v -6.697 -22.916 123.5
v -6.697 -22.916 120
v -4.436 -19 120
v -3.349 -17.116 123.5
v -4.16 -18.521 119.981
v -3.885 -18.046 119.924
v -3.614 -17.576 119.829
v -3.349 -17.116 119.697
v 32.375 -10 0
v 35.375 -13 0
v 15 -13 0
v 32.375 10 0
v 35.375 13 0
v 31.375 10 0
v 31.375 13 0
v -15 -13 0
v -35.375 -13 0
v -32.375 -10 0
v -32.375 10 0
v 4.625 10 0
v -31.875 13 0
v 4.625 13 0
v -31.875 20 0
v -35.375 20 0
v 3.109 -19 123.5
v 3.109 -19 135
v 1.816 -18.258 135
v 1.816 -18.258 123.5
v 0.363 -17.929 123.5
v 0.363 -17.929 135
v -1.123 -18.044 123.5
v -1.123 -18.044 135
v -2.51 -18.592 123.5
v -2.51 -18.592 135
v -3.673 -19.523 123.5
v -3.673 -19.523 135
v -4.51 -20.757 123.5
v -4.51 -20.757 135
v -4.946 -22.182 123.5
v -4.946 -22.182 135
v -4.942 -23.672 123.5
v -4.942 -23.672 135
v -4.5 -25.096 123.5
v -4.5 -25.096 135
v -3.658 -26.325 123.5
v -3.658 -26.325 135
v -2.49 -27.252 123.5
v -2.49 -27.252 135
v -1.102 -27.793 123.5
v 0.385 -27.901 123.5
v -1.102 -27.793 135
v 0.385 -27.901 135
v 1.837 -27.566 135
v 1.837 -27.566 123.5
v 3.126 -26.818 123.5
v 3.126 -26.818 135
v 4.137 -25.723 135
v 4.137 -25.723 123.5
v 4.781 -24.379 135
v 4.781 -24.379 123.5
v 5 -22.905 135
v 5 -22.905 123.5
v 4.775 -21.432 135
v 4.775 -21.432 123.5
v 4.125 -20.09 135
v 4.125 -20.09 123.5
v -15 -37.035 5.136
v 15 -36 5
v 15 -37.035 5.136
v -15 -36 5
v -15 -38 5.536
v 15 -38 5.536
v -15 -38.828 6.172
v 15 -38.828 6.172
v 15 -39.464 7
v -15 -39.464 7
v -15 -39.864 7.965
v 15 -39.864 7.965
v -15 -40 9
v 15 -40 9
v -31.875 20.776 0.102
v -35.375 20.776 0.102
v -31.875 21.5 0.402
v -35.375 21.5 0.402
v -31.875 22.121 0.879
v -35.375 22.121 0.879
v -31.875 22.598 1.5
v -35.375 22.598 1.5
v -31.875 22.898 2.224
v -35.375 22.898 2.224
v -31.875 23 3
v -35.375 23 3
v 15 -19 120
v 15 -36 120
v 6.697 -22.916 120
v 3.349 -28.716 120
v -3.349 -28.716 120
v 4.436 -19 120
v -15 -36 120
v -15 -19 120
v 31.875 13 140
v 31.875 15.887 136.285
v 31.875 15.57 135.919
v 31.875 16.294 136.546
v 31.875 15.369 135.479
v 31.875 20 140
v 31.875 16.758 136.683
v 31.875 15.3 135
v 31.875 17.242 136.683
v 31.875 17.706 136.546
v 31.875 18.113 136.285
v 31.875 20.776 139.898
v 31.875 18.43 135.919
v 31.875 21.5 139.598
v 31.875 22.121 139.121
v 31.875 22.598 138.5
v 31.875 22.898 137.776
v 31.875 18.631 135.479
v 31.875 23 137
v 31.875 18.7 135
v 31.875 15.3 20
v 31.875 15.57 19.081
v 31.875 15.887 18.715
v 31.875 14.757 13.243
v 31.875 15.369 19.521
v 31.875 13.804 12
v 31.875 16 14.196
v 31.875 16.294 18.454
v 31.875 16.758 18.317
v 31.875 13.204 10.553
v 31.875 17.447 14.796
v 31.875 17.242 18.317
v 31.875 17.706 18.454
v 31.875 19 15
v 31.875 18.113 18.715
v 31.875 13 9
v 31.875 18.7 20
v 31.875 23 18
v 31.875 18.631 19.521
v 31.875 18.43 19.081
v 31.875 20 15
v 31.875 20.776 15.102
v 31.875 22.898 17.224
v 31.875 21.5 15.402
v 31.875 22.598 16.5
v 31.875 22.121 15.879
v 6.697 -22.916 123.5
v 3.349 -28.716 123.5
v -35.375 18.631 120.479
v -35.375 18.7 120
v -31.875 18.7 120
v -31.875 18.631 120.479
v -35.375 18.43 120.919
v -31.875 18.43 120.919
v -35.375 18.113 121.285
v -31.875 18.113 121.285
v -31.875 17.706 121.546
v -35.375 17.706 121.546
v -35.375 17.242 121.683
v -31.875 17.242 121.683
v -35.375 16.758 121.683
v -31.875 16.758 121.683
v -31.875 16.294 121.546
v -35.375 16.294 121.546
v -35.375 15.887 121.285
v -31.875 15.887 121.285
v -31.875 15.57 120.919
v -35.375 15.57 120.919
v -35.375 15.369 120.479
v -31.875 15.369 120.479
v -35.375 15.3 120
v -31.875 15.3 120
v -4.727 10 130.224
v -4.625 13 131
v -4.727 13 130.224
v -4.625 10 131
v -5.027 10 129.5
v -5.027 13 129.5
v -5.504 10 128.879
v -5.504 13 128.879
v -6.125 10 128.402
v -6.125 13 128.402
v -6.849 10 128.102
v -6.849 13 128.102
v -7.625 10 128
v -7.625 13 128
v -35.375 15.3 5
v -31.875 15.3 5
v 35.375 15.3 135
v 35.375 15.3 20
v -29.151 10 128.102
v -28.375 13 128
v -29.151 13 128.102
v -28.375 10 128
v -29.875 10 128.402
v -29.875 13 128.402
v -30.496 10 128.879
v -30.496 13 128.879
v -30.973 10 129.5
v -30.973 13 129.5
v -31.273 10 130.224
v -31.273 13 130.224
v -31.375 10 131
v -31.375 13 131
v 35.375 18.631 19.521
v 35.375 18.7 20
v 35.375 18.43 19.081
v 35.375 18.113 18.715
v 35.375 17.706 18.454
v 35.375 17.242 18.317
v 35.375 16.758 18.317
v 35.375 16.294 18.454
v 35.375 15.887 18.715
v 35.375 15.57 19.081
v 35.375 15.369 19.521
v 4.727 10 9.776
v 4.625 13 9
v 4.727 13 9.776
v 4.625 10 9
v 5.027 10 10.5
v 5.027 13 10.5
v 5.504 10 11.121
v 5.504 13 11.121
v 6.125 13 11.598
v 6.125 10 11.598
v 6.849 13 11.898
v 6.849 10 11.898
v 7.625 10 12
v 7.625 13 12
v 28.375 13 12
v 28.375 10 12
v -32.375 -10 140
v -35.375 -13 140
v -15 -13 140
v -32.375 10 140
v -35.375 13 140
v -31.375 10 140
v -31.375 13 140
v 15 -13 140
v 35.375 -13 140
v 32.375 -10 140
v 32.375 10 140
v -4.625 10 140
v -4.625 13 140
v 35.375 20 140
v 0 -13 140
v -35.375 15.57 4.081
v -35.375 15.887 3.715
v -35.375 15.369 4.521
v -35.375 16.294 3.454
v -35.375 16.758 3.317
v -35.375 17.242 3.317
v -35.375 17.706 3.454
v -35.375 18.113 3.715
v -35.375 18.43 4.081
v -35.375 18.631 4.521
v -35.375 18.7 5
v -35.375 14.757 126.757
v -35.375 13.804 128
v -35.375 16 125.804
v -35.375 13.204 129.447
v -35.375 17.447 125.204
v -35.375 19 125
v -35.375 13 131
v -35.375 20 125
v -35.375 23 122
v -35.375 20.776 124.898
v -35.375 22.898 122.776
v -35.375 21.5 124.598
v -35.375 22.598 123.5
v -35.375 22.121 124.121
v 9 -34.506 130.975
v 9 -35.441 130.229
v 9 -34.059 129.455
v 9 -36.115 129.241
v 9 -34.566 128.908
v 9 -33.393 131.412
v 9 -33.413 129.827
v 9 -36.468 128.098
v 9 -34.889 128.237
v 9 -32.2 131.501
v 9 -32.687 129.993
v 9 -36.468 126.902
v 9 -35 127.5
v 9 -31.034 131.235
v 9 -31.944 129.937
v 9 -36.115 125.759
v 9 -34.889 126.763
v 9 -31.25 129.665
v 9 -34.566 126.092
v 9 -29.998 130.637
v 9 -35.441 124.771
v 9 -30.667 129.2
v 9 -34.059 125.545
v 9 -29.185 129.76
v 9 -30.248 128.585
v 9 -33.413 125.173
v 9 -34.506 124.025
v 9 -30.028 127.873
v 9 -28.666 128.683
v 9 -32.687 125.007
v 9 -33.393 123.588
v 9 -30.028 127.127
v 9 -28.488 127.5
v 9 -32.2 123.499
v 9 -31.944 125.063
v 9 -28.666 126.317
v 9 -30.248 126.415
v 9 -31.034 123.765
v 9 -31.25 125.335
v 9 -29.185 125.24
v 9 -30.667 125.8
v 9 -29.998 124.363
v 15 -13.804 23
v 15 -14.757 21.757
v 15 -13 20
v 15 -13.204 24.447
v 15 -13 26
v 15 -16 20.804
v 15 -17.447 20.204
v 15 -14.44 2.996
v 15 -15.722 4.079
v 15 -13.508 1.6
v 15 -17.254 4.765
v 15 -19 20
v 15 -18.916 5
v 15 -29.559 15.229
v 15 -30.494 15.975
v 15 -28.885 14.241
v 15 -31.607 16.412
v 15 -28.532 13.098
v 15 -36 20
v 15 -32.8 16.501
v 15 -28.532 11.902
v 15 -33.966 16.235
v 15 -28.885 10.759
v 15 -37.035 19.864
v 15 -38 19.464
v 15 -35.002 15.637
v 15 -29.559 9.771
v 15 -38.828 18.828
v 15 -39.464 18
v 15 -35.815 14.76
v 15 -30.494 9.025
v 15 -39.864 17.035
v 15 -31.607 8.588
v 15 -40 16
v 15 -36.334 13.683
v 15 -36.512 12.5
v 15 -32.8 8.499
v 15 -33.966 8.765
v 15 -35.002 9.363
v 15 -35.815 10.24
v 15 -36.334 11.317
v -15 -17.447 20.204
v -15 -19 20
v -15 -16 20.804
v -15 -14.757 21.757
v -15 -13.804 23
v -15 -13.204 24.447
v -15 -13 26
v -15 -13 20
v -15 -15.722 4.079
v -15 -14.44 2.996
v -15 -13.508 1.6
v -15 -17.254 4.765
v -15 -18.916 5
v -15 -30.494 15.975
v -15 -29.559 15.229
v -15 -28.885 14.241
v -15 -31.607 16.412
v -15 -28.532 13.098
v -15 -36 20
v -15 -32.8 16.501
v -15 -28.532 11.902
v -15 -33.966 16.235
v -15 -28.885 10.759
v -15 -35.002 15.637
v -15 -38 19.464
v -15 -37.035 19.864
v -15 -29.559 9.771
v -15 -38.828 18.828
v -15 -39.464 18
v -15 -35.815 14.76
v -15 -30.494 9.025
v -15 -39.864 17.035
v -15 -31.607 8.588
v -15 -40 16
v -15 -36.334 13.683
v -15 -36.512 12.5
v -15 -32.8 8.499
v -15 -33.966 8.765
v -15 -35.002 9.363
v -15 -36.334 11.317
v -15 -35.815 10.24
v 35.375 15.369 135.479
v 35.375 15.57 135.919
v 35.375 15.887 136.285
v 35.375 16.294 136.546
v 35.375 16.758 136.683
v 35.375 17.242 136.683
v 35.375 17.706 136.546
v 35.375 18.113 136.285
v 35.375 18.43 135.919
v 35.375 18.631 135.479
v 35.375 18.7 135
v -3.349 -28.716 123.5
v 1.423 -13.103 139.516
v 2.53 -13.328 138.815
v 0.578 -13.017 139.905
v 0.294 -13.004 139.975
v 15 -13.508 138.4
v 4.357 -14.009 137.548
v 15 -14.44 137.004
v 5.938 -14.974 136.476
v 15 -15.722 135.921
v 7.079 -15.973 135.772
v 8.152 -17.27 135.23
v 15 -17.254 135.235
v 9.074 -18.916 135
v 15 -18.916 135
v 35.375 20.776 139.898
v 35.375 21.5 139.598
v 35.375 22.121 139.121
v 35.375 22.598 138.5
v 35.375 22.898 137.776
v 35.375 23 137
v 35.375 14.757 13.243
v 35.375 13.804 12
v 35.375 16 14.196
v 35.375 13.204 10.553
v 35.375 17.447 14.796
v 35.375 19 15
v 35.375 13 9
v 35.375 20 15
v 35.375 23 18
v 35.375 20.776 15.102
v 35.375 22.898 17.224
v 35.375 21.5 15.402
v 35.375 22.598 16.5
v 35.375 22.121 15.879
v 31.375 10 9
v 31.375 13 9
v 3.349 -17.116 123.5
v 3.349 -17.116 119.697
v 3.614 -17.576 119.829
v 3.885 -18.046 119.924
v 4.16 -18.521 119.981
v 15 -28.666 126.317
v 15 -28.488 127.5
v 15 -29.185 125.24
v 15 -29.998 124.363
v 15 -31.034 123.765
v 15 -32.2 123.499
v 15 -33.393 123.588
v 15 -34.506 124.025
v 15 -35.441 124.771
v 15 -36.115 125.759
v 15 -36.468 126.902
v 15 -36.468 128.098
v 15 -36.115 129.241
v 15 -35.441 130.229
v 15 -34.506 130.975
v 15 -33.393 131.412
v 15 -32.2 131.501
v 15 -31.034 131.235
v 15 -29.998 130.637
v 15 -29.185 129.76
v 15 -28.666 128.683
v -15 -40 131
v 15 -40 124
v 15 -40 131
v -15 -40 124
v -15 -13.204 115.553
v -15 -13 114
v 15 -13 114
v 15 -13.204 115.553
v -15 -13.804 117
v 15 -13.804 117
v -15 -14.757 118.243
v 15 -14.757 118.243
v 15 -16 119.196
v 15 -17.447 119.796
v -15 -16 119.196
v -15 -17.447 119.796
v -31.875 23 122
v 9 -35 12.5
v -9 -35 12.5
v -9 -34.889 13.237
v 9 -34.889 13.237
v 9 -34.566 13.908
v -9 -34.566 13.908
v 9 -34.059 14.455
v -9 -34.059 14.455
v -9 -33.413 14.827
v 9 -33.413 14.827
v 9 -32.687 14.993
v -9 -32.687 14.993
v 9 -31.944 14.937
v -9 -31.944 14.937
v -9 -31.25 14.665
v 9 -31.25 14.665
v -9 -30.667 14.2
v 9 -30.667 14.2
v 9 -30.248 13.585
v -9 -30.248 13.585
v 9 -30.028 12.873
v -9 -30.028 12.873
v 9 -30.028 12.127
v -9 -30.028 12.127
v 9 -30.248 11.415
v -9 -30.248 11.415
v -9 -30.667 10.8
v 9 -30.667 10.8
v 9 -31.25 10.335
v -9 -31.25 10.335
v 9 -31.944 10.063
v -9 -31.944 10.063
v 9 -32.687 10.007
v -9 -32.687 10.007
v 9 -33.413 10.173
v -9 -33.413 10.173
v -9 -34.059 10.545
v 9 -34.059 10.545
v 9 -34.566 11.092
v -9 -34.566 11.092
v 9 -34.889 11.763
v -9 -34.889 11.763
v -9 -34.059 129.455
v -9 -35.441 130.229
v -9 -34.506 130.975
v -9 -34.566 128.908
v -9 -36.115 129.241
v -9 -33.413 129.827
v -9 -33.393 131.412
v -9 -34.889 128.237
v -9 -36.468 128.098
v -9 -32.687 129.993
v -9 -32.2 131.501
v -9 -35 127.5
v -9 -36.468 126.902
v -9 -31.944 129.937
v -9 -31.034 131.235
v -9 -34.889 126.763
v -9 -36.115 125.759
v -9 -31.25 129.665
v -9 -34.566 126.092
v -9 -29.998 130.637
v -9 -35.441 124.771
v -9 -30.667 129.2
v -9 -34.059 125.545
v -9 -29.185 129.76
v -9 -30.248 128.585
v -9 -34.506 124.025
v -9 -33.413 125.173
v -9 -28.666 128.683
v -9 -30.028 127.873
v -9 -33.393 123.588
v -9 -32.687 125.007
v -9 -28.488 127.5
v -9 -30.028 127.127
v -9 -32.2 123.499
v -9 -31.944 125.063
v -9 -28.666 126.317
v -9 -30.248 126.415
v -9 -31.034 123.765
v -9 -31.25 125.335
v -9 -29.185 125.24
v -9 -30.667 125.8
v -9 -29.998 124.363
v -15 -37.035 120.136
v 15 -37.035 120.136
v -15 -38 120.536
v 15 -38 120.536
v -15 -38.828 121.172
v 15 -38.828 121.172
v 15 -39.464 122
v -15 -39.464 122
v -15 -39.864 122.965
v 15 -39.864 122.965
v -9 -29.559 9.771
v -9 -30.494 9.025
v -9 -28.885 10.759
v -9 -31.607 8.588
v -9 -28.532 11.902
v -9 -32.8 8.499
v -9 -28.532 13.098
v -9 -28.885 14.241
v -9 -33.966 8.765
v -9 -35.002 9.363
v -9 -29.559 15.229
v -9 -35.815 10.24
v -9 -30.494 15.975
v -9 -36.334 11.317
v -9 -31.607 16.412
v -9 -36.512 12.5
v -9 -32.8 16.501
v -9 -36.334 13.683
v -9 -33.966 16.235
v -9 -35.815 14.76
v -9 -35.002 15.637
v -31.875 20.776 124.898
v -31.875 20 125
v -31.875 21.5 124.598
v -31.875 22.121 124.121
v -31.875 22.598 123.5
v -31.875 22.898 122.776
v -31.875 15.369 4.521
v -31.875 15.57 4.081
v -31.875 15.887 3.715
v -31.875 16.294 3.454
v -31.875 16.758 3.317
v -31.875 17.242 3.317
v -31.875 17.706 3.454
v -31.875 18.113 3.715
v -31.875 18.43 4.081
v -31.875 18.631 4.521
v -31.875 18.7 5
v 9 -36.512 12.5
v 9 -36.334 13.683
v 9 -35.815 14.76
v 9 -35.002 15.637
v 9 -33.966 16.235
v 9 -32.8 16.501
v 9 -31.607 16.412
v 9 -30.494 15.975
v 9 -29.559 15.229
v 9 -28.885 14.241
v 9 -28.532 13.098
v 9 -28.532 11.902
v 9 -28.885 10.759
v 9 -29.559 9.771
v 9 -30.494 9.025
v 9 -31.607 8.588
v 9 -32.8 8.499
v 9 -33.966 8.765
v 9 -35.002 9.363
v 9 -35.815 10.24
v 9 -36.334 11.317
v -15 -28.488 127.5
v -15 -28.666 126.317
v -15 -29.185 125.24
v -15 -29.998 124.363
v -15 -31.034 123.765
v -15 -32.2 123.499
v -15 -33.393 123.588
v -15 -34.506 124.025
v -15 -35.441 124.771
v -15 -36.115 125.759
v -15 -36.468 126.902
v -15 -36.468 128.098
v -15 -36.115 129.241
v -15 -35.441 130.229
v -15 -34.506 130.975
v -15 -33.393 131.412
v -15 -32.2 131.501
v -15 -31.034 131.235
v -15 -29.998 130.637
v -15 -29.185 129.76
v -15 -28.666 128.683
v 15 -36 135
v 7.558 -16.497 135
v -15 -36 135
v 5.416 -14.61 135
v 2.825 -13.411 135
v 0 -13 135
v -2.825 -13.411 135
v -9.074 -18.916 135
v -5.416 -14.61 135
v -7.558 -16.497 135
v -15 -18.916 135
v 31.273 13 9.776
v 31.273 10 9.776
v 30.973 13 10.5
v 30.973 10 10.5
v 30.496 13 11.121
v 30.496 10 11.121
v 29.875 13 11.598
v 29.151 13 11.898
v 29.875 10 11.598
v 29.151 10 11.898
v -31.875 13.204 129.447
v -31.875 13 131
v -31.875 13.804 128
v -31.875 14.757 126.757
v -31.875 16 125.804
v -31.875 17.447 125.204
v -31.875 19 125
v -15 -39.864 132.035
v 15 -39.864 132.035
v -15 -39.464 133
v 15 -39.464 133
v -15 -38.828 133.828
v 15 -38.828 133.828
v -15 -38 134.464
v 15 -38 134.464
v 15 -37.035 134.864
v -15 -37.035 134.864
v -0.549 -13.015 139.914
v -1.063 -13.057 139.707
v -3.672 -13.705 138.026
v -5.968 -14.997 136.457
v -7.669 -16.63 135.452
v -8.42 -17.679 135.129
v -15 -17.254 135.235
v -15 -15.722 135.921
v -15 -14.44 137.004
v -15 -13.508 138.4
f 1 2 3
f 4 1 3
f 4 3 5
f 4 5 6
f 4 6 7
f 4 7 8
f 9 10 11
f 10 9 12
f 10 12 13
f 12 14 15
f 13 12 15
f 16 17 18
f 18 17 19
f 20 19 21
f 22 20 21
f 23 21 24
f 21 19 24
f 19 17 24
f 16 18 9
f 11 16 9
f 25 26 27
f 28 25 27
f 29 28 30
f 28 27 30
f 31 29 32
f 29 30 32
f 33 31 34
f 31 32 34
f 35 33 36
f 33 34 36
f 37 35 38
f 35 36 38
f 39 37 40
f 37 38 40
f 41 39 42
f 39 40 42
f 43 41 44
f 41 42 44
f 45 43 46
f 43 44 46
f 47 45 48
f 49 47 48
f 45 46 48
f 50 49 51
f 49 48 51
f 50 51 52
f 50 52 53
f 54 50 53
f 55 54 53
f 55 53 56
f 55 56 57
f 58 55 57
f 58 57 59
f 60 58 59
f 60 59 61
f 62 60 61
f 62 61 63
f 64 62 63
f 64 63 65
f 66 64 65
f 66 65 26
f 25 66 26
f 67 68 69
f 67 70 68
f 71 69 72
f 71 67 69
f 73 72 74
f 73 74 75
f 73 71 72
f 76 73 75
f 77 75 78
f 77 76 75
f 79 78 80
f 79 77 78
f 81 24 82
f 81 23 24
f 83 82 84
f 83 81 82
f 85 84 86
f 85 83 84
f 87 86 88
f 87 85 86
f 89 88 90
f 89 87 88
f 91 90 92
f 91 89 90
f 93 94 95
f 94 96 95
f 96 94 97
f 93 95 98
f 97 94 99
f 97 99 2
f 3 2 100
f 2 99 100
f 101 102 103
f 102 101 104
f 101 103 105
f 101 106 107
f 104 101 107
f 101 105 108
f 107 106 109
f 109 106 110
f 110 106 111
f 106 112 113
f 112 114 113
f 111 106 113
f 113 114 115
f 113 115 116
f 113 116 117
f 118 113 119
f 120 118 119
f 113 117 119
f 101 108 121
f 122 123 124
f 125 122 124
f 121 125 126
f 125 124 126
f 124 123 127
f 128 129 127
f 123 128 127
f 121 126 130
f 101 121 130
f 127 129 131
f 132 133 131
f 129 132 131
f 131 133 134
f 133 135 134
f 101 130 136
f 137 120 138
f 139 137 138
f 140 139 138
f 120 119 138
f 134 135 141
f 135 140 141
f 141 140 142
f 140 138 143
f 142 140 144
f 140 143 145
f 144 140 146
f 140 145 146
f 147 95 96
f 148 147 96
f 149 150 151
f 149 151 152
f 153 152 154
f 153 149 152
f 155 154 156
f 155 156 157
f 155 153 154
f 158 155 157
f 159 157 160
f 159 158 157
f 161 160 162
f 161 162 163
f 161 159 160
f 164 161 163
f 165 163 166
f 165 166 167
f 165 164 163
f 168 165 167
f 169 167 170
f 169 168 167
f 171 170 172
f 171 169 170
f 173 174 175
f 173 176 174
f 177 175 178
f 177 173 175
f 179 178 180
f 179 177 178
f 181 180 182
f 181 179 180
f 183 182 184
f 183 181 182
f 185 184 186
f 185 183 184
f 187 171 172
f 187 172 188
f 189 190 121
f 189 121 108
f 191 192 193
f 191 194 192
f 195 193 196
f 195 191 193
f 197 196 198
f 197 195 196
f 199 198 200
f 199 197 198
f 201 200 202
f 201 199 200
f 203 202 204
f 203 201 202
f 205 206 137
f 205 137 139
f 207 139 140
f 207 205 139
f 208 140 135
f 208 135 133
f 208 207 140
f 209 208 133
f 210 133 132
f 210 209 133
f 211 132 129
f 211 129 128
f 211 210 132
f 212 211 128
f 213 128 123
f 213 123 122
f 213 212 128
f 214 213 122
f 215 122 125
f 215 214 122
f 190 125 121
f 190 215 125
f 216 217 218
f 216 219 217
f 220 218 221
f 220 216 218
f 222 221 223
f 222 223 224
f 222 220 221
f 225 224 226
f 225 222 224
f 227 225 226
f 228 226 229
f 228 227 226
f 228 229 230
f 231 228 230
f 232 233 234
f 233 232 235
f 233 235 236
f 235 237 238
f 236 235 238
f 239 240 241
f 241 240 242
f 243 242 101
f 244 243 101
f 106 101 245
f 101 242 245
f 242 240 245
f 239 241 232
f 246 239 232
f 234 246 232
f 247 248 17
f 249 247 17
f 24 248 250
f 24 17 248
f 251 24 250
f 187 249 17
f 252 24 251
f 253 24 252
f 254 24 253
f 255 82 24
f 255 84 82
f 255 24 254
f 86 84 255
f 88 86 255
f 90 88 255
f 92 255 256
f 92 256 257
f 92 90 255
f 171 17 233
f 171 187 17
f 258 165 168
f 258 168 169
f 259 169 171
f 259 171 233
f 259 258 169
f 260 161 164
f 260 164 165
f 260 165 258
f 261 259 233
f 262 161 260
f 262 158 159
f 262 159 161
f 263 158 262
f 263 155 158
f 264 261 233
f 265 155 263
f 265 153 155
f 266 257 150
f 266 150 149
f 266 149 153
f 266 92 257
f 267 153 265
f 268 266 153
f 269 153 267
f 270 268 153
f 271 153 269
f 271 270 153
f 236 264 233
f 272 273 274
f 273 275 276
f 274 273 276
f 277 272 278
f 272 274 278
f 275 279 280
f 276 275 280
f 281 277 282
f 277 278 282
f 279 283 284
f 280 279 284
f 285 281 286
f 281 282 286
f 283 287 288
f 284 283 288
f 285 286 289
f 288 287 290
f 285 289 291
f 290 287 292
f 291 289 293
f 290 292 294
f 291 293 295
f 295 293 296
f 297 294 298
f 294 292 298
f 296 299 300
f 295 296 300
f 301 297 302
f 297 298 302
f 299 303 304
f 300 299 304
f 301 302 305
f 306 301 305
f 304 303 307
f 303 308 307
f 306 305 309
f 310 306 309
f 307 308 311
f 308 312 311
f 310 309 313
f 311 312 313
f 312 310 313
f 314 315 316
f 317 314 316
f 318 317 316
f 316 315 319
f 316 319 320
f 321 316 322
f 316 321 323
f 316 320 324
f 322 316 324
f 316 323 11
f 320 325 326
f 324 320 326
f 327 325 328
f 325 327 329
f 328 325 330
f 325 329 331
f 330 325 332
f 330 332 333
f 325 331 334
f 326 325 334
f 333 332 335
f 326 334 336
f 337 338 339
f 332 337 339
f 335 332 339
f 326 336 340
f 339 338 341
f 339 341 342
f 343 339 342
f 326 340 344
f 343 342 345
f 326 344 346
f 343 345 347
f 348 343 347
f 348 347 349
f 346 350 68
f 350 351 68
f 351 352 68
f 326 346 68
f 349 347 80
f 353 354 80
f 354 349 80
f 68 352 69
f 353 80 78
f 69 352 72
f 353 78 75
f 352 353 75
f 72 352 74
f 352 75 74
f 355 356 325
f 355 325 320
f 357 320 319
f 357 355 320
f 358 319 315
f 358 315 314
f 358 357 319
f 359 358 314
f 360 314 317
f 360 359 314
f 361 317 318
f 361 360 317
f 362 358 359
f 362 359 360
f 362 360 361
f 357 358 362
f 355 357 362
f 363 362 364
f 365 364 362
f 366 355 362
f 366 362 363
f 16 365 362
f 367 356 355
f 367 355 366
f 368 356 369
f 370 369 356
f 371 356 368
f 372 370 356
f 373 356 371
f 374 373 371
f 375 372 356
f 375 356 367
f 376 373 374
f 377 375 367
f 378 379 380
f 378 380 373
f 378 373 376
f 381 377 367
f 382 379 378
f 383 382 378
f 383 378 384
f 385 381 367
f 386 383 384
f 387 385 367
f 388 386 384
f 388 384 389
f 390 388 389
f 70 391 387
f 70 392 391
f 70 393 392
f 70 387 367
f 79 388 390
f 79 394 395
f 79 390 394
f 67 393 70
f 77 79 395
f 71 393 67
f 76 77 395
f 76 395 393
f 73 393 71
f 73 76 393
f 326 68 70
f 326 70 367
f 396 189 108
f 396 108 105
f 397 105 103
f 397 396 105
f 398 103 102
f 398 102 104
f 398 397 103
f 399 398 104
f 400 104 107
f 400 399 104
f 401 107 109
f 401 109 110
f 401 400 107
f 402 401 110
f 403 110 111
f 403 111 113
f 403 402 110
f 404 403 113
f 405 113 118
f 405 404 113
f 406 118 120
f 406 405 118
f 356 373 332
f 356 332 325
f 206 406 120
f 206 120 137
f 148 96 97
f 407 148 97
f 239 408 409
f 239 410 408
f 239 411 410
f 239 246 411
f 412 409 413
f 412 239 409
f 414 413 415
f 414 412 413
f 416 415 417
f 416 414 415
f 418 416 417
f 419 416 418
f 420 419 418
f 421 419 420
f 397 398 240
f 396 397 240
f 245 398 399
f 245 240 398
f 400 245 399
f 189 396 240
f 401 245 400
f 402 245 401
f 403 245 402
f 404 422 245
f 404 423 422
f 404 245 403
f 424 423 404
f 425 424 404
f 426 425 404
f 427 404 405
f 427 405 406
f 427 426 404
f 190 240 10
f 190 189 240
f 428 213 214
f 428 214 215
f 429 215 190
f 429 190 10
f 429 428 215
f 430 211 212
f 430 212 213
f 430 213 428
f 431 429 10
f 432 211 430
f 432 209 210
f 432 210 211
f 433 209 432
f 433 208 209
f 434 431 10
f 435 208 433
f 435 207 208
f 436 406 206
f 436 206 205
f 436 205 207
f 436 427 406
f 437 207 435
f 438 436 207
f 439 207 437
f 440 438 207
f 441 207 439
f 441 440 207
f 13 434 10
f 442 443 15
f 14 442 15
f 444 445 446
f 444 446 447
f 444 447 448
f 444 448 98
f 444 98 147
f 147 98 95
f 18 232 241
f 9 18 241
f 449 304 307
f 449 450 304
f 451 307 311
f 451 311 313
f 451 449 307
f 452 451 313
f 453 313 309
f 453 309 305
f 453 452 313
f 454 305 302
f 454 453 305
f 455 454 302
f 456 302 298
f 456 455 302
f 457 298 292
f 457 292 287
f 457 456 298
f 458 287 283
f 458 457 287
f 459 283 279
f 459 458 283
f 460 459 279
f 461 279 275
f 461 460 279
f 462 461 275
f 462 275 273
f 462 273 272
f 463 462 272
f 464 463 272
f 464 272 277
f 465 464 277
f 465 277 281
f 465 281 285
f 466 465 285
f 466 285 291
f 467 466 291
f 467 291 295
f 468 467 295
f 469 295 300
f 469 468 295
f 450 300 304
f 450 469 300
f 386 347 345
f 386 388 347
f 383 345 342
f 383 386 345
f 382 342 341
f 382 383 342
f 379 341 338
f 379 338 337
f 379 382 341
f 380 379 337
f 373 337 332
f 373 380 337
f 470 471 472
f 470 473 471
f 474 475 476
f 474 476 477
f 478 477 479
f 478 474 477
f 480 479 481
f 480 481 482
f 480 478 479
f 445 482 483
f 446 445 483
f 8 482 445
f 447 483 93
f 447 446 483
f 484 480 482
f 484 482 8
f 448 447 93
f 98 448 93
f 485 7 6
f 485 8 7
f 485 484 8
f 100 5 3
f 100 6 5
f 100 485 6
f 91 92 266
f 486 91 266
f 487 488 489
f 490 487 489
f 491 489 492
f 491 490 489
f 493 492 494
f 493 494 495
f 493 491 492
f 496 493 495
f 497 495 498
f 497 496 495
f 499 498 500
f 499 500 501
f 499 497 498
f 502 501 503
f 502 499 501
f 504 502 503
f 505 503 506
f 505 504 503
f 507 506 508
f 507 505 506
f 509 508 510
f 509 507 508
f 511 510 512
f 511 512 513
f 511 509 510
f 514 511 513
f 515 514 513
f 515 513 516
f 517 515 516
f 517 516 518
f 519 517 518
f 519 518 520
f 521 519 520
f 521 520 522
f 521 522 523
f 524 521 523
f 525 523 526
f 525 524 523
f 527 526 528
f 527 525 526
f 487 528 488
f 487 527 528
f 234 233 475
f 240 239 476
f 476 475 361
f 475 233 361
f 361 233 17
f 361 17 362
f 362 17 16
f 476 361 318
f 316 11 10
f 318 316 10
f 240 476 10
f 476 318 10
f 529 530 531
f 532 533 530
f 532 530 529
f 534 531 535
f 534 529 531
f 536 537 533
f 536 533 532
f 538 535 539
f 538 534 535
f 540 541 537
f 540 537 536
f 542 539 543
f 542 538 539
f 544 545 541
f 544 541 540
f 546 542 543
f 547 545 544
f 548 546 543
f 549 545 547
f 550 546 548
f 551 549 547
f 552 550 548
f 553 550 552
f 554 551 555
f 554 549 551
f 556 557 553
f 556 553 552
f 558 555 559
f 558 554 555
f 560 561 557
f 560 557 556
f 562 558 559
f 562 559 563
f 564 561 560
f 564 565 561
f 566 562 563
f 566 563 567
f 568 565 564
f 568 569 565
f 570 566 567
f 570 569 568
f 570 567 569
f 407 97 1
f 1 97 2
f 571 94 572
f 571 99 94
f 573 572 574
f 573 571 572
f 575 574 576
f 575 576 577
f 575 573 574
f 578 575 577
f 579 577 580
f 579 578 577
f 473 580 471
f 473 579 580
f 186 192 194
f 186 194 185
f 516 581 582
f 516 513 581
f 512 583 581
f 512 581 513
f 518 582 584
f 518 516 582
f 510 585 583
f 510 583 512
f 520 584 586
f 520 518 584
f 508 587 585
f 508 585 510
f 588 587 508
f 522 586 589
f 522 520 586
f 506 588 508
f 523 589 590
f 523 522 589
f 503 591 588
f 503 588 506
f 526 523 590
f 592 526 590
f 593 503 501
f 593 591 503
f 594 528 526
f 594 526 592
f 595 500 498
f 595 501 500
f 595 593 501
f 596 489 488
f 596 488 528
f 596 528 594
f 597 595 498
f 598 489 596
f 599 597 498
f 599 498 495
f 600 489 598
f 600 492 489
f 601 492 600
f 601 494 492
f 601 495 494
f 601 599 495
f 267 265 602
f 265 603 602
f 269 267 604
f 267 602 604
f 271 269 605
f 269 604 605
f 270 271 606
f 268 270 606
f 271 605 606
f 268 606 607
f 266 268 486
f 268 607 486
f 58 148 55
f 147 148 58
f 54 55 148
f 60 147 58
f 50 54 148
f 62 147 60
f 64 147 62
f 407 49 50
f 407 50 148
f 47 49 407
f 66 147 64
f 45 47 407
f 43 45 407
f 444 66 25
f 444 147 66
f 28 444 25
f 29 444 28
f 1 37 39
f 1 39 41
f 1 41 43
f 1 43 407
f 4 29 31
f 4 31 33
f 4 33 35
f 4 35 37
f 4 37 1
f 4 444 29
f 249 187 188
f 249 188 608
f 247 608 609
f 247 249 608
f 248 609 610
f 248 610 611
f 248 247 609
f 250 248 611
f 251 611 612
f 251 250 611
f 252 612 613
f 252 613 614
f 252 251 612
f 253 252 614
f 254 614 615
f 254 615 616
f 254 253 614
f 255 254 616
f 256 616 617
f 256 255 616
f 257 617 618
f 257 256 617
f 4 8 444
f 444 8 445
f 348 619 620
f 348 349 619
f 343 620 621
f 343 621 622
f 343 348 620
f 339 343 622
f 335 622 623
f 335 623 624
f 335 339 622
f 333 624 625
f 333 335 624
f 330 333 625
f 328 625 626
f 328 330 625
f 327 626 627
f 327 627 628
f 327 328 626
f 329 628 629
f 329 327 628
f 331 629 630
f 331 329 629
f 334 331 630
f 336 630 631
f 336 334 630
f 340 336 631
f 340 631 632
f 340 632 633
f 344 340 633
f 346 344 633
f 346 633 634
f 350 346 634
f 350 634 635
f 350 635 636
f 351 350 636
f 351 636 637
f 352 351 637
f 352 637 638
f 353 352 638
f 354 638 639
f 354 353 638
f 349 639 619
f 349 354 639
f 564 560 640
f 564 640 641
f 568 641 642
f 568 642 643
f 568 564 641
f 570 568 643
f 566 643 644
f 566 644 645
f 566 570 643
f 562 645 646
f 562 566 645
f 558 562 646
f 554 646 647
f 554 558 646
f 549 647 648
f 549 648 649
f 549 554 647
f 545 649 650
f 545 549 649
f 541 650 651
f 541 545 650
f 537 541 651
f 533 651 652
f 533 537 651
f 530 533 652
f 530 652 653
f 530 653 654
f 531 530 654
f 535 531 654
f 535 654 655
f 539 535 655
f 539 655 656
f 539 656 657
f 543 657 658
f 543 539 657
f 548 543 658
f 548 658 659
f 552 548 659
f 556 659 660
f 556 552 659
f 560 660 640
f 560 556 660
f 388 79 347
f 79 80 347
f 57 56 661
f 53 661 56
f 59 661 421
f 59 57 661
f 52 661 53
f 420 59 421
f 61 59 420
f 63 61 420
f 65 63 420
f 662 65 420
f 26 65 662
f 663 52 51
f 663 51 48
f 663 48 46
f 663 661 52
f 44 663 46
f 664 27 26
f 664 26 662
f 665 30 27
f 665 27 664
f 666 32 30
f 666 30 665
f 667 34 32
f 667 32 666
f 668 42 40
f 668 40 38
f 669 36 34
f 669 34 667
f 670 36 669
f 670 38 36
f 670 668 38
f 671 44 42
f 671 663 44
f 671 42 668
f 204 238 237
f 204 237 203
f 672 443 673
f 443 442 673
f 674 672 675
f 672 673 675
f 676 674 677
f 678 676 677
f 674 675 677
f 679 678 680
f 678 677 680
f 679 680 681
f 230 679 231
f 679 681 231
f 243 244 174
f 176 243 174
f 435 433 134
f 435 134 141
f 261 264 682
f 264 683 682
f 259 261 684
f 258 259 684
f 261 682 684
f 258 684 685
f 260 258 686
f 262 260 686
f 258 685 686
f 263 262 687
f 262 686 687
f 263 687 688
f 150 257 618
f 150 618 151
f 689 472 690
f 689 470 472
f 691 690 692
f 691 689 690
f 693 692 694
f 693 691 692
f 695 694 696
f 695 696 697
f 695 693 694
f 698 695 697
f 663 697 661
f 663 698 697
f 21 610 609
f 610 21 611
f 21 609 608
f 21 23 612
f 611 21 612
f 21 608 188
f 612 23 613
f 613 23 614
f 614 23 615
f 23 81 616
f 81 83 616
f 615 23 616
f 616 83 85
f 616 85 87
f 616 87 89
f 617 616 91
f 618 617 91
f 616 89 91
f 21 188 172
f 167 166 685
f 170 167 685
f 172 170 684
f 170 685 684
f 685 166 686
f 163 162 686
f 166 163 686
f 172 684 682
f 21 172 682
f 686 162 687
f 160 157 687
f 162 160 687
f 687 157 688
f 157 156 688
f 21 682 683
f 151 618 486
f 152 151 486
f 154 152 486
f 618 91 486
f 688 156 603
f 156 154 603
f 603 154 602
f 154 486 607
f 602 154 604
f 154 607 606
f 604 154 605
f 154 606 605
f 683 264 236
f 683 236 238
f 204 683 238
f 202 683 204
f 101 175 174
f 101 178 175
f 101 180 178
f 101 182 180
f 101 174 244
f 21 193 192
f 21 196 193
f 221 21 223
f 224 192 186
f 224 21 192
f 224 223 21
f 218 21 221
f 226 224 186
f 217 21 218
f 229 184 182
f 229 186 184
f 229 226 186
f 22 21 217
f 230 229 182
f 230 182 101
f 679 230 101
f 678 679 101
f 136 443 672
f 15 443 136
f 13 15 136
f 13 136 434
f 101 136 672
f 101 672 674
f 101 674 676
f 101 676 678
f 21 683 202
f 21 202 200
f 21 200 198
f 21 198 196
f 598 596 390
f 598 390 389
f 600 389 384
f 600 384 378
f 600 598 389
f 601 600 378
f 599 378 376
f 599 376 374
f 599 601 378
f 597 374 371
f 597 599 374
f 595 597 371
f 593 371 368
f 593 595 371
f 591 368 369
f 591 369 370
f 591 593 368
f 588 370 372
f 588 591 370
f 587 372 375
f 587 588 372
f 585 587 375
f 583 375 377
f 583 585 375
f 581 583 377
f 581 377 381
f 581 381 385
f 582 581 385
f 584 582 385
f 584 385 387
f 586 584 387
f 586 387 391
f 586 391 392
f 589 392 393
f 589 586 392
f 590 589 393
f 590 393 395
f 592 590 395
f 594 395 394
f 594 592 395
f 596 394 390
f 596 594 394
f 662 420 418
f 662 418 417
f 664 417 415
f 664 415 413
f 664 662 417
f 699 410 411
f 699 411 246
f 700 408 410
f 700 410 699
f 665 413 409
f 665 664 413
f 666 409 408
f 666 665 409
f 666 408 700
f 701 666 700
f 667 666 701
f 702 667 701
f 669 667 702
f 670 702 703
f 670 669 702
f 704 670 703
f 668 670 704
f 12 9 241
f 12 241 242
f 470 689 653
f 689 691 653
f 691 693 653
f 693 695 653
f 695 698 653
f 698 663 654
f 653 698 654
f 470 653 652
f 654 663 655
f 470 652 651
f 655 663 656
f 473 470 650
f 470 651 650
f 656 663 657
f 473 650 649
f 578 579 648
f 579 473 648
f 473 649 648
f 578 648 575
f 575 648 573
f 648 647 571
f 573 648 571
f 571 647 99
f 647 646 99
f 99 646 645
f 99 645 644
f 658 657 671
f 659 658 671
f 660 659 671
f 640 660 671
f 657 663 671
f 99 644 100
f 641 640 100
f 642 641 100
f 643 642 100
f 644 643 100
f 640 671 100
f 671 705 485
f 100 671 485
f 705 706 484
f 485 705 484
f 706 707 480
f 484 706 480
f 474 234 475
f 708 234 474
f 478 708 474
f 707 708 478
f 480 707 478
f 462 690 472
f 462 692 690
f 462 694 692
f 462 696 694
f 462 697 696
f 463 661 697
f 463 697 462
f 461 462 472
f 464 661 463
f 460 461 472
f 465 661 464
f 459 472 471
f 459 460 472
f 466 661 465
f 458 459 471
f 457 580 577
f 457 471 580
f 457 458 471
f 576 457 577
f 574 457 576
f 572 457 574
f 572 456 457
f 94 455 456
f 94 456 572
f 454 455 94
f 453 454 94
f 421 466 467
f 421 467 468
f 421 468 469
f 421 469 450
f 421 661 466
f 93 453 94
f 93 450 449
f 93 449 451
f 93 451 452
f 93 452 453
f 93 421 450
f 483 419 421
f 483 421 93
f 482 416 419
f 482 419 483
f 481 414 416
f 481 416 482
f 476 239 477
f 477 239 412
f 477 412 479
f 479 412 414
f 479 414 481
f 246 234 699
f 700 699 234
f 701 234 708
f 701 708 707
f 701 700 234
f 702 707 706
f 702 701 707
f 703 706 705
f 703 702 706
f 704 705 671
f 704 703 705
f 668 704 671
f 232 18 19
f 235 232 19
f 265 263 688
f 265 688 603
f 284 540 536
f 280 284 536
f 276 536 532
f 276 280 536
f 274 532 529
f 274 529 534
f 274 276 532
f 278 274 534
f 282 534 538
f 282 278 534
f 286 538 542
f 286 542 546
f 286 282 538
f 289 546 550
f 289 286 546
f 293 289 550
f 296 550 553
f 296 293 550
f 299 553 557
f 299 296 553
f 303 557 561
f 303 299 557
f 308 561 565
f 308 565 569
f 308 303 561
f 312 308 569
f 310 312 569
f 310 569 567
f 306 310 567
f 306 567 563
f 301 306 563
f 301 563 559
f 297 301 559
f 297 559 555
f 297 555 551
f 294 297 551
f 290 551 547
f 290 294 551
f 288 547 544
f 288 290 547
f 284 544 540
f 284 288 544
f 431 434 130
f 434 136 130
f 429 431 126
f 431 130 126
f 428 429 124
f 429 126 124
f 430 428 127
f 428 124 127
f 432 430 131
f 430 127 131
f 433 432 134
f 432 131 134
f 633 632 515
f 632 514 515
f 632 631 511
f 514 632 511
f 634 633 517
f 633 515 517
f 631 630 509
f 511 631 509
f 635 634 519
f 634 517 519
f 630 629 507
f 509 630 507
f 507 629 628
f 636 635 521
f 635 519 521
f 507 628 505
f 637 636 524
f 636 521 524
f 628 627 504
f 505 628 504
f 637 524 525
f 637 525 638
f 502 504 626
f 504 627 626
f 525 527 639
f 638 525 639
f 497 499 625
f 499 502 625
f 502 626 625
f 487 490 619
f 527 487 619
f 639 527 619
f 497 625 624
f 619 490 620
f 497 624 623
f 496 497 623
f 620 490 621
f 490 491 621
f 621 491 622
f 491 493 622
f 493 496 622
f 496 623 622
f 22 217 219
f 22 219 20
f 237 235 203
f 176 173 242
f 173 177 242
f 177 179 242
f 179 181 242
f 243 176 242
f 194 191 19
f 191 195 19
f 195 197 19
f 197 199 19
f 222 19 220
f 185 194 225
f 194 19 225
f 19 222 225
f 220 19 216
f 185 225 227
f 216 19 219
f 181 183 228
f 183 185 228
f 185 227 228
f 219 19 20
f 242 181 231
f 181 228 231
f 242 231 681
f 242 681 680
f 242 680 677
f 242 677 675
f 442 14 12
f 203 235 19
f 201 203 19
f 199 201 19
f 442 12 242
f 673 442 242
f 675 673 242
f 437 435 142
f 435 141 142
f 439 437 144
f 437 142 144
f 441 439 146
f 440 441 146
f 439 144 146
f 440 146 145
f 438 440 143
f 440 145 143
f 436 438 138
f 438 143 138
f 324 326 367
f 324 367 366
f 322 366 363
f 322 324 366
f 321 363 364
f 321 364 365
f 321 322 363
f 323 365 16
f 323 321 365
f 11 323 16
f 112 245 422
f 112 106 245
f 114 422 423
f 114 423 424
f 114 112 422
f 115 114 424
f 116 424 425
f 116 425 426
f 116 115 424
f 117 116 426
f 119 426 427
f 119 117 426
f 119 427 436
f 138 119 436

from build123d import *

# Parameters (mm, degrees)
SKETCH1_W            = 64.75
SKETCH1_H            = 20
BODY_DEPTH           = 140
SHELL1_T             = 3
SWITCH_CUTOUT_REACH  = 148.722
SKETCH2_W            = 26.75
SKETCH2_H            = 12
SKETCH4_W            = 15
SKETCH4_H            = 27
SKETCH4_R            = 4.0125
AXLE_HOLDER_DEPTH    = 15
SKETCH5_R            = 4.0125
SKETCH5_R_2          = 2.5
BUSHING_HOLDER_DEPTH = 9
FILLET3_R            = 4
FILLET4_R            = 6
SKETCH6_W            = 125
SKETCH6_H            = 10
SLIDE_MOUNT_DEPTH    = 3.5
CIRPATTERN1_COUNT    = 2
FILLET6_R            = 3
FILLET7_R            = 3
FILLET8_R            = 6
CUT_EXTRUDE1_REACH   = 147.177
SKETCH7_R            = 5
SKETCH8_R            = 9.916079783
CUT_EXTRUDE2_DEPTH   = 9
CUT_EXTRUDE3_DEPTH   = 3.5


with BuildPart() as part:
    # Sketch1 → Body (new body)
    with BuildSketch(Plane.XY):
        Rectangle(SKETCH1_W, SKETCH1_H)
    extrude(amount=BODY_DEPTH)

    # Shell1
    shell1_openings = [part.faces().sort_by_distance(p)[0] for p in [
        (0, 0, 0),
        (0, 0, 140),
    ]]
    offset(amount=SHELL1_T, openings=shell1_openings, kind=Kind.INTERSECTION)

    # Sketch2 → Switch_cutout (cut, up to next)
    with BuildSketch(Plane(origin=(0, 13, 0), x_dir=(1, 0, 0), z_dir=(0, 1, 0)), mode=Mode.PRIVATE) as switch_cutout_sk1:
        with Locations((18, -6)):
            Rectangle(SKETCH2_W, SKETCH2_H)
    switch_cutout_tool1 = extrude(switch_cutout_sk1.sketch, amount=-SWITCH_CUTOUT_REACH, mode=Mode.PRIVATE) & part.part
    # Sketch2 → Switch_cutout (cut, up to next)
    with BuildSketch(Plane(origin=(0, 13, 0), x_dir=(1, 0, 0), z_dir=(0, 1, 0)), mode=Mode.PRIVATE) as switch_cutout_sk2:
        with Locations((-18, -134)):
            Rectangle(SKETCH2_W, SKETCH2_H)
    switch_cutout_tool2 = extrude(switch_cutout_sk2.sketch, amount=-SWITCH_CUTOUT_REACH, mode=Mode.PRIVATE) & part.part
    add(switch_cutout_tool1.solids().sort_by_distance((18, 13, 6))[0], mode=Mode.SUBTRACT)
    add(switch_cutout_tool2.solids().sort_by_distance((-18, 13, 134))[0], mode=Mode.SUBTRACT)

    # Sketch4 → Axle_holder (add, symmetric)
    # profile 1 of 2: a face of its own
    with BuildSketch(Plane.ZY):
        with Locations((12.5, -26.5)):
            Rectangle(SKETCH4_W, SKETCH4_H)
        with Locations(Location((12.5, -32.5, 0), (0, 0, 270))):
            Circle(SKETCH4_R, mode=Mode.SUBTRACT)
    # profile 2 of 2: a face of its own
    with BuildSketch(Plane.ZY):
        with Locations((127.5, -26.5)):
            Rectangle(SKETCH4_W, SKETCH4_H)
        with Locations(Location((127.5, -32.5, 0), (0, 0, 90))):
            Circle(SKETCH4_R, mode=Mode.SUBTRACT)
    extrude(amount=AXLE_HOLDER_DEPTH, both=True)

    # Sketch5 → Bushing_holder (add, symmetric)
    # profile 1 of 2: a face of its own
    with BuildSketch(Plane.ZY):
        with Locations(Location((12.5, -32.5, 0), (0, 0, 270))):
            Circle(SKETCH5_R)
        with Locations(Location((12.5, -32.5, 0), (0, 0, 270))):
            Circle(SKETCH5_R_2, mode=Mode.SUBTRACT)
    # profile 2 of 2: a face of its own
    with BuildSketch(Plane.ZY):
        with Locations(Location((127.5, -32.5, 0), (0, 0, 90))):
            Circle(SKETCH5_R)
        with Locations(Location((127.5, -32.5, 0), (0, 0, 270))):
            Circle(SKETCH5_R_2, mode=Mode.SUBTRACT)
    extrude(amount=BUSHING_HOLDER_DEPTH, both=True)

    # Fillet3
    fillet3_edges = [part.edges().sort_by_distance(p)[0] for p in [
        (0, -40, 5),
        (0, -40, 20),
        (0, -40, 135),
        (0, -40, 120),
    ]]
    fillet(fillet3_edges, radius=FILLET3_R)

    # Fillet4
    # the kernel refuses this fillet: 6 mm, written as the material it adds along each edge
    with BuildSketch(Plane(origin=(15, -13, 5), x_dir=(0, 0, -1), z_dir=(-1, 0, 0))) as fillet4_piece_1:
        with BuildLine():
            CenterArc((6, 5.916079783), FILLET4_R, 180, 80.405931773)
            Line((0, 5.916079783), (-0.12, 5.916079783))
            Line((-0.12, 5.916079783), (-0.12, 0))
            Line((-0.12, 0), (0, -0.12))
            ThreePointArc((0, -0.12), (2.5, -0.12), (4.98, -0.118321596))
            Line((4.98, -0.118321596), (5, 0))
        make_face()
    extrude(amount=30)
    with BuildSketch(Plane(origin=(-15, -13, 20), x_dir=(0, 0, 1), z_dir=(1, 0, 0)), Plane(origin=(-15, -13, 120), x_dir=(0, -1, 0), z_dir=(1, 0, 0))) as fillet4_piece_2:
        with BuildLine():
            CenterArc((FILLET4_R, FILLET4_R), FILLET4_R, 180, 90)
            Line((0, FILLET4_R), (-FILLET4_R * 0.02, FILLET4_R))
            Line((-FILLET4_R * 0.02, FILLET4_R), (-FILLET4_R * 0.02, -FILLET4_R * 0.02))
            Line((-FILLET4_R * 0.02, -FILLET4_R * 0.02), (FILLET4_R, -FILLET4_R * 0.02))
            Line((FILLET4_R, -FILLET4_R * 0.02), (FILLET4_R, 0))
        make_face()
    extrude(amount=30)
    with BuildSketch(Plane(origin=(15, -13, 135), x_dir=(0, 0, 1), z_dir=(-1, 0, 0))) as fillet4_piece_3:
        with BuildLine():
            CenterArc((6, -5.916079783), FILLET4_R, 99.594068227, 80.405931773)
            Line((0, -5.916079783), (-0.12, -5.916079783))
            Line((-0.12, -5.916079783), (-0.12, 0))
            Line((-0.12, 0), (0, 0.12))
            ThreePointArc((0, 0.12), (2.5, 0.12), (4.98, 0.118321596))
            Line((4.98, 0.118321596), (5, 0))
        make_face()
    extrude(amount=30)

    # Sketch6 → Slide_mount (add)
    with BuildSketch(Plane(origin=(35.375, 0, 0), x_dir=(0, 0, -1), z_dir=(1, 0, 0))):
        with Locations((-77.5, 18)):
            Rectangle(SKETCH6_W, SKETCH6_H)
        with BuildLine():
            Line((-135, 18.7), (-20, 18.7))
            ThreePointArc((-20, 18.7), (-18.3, 17), (-20, 15.3))
            Line((-20, 15.3), (-135, 15.3))
            ThreePointArc((-135, 15.3), (-136.7, 17), (-135, 18.7))
        make_face(mode=Mode.SUBTRACT)
    slide_mount = extrude(amount=-SLIDE_MOUNT_DEPTH)

    # CirPattern1: Slide_mount ×2 about axis
    cirpattern1_axis = Axis((0, 0, 70), (0, 1, 0))
    for i in range(1, CIRPATTERN1_COUNT):
        add(slide_mount.rotate(cirpattern1_axis, i * 360 / CIRPATTERN1_COUNT))

    # Fillet6
    fillet6_edges = [part.edges().sort_by_distance(p)[0] for p in [
        (33.625, 23, 140),
        (33.625, 23, 15),
        (-33.625, 23, 0),
        (-33.625, 23, 125),
    ]]
    fillet(fillet6_edges, radius=FILLET6_R)

    # Fillet7
    fillet7_edges = [part.edges().sort_by_distance(p)[0] for p in [
        (4.625, 11.5, 12),
        (31.375, 11.5, 12),
        (-31.375, 11.5, 128),
        (-4.625, 11.5, 128),
    ]]
    fillet(fillet7_edges, radius=FILLET7_R)

    # Fillet8
    fillet8_edges = [part.edges().sort_by_distance(p)[0] for p in [
        (33.625, 13, 15),
        (-33.625, 13, 125),
    ]]
    fillet(fillet8_edges, radius=FILLET8_R)

    # Sketch7 → Cut-Extrude1 (cut, up to next)
    with BuildSketch(Plane.XY.offset(135), mode=Mode.PRIVATE) as cut_extrude1_sk1:
        with Locations(Location((0, -22.916079783, 0), (0, 0, 51.555975818))):
            Circle(SKETCH7_R)
    cut_extrude1_tool1 = extrude(cut_extrude1_sk1.sketch, amount=-CUT_EXTRUDE1_REACH, mode=Mode.PRIVATE) & part.part
    add(cut_extrude1_tool1.solids().sort_by_distance((0, -22.91608, 135))[0], mode=Mode.SUBTRACT)

    # Sketch8 → Cut-Extrude2 (cut)
    with BuildSketch(Plane.XY.offset(135)):
        with Locations((0, -22.916079783)):
            Circle(SKETCH8_R)
    extrude(amount=CUT_EXTRUDE2_DEPTH, mode=Mode.SUBTRACT)

    # Sketch9 → Cut-Extrude3 (cut, symmetric)
    with BuildSketch(Plane(origin=(0, 0, 120), x_dir=(-1, 0, 0), z_dir=(0, 0, -1))):
        Polygon((-6.697263123, -22.916079783), (-3.348631561, -28.716079783), (3.348631561, -28.716079783), (6.697263123, -22.916079783), (3.348631561, -17.116079783), (-3.348631561, -17.116079783), align=None)
    extrude(amount=CUT_EXTRUDE3_DEPTH, both=True, mode=Mode.SUBTRACT)


solid = part.part
